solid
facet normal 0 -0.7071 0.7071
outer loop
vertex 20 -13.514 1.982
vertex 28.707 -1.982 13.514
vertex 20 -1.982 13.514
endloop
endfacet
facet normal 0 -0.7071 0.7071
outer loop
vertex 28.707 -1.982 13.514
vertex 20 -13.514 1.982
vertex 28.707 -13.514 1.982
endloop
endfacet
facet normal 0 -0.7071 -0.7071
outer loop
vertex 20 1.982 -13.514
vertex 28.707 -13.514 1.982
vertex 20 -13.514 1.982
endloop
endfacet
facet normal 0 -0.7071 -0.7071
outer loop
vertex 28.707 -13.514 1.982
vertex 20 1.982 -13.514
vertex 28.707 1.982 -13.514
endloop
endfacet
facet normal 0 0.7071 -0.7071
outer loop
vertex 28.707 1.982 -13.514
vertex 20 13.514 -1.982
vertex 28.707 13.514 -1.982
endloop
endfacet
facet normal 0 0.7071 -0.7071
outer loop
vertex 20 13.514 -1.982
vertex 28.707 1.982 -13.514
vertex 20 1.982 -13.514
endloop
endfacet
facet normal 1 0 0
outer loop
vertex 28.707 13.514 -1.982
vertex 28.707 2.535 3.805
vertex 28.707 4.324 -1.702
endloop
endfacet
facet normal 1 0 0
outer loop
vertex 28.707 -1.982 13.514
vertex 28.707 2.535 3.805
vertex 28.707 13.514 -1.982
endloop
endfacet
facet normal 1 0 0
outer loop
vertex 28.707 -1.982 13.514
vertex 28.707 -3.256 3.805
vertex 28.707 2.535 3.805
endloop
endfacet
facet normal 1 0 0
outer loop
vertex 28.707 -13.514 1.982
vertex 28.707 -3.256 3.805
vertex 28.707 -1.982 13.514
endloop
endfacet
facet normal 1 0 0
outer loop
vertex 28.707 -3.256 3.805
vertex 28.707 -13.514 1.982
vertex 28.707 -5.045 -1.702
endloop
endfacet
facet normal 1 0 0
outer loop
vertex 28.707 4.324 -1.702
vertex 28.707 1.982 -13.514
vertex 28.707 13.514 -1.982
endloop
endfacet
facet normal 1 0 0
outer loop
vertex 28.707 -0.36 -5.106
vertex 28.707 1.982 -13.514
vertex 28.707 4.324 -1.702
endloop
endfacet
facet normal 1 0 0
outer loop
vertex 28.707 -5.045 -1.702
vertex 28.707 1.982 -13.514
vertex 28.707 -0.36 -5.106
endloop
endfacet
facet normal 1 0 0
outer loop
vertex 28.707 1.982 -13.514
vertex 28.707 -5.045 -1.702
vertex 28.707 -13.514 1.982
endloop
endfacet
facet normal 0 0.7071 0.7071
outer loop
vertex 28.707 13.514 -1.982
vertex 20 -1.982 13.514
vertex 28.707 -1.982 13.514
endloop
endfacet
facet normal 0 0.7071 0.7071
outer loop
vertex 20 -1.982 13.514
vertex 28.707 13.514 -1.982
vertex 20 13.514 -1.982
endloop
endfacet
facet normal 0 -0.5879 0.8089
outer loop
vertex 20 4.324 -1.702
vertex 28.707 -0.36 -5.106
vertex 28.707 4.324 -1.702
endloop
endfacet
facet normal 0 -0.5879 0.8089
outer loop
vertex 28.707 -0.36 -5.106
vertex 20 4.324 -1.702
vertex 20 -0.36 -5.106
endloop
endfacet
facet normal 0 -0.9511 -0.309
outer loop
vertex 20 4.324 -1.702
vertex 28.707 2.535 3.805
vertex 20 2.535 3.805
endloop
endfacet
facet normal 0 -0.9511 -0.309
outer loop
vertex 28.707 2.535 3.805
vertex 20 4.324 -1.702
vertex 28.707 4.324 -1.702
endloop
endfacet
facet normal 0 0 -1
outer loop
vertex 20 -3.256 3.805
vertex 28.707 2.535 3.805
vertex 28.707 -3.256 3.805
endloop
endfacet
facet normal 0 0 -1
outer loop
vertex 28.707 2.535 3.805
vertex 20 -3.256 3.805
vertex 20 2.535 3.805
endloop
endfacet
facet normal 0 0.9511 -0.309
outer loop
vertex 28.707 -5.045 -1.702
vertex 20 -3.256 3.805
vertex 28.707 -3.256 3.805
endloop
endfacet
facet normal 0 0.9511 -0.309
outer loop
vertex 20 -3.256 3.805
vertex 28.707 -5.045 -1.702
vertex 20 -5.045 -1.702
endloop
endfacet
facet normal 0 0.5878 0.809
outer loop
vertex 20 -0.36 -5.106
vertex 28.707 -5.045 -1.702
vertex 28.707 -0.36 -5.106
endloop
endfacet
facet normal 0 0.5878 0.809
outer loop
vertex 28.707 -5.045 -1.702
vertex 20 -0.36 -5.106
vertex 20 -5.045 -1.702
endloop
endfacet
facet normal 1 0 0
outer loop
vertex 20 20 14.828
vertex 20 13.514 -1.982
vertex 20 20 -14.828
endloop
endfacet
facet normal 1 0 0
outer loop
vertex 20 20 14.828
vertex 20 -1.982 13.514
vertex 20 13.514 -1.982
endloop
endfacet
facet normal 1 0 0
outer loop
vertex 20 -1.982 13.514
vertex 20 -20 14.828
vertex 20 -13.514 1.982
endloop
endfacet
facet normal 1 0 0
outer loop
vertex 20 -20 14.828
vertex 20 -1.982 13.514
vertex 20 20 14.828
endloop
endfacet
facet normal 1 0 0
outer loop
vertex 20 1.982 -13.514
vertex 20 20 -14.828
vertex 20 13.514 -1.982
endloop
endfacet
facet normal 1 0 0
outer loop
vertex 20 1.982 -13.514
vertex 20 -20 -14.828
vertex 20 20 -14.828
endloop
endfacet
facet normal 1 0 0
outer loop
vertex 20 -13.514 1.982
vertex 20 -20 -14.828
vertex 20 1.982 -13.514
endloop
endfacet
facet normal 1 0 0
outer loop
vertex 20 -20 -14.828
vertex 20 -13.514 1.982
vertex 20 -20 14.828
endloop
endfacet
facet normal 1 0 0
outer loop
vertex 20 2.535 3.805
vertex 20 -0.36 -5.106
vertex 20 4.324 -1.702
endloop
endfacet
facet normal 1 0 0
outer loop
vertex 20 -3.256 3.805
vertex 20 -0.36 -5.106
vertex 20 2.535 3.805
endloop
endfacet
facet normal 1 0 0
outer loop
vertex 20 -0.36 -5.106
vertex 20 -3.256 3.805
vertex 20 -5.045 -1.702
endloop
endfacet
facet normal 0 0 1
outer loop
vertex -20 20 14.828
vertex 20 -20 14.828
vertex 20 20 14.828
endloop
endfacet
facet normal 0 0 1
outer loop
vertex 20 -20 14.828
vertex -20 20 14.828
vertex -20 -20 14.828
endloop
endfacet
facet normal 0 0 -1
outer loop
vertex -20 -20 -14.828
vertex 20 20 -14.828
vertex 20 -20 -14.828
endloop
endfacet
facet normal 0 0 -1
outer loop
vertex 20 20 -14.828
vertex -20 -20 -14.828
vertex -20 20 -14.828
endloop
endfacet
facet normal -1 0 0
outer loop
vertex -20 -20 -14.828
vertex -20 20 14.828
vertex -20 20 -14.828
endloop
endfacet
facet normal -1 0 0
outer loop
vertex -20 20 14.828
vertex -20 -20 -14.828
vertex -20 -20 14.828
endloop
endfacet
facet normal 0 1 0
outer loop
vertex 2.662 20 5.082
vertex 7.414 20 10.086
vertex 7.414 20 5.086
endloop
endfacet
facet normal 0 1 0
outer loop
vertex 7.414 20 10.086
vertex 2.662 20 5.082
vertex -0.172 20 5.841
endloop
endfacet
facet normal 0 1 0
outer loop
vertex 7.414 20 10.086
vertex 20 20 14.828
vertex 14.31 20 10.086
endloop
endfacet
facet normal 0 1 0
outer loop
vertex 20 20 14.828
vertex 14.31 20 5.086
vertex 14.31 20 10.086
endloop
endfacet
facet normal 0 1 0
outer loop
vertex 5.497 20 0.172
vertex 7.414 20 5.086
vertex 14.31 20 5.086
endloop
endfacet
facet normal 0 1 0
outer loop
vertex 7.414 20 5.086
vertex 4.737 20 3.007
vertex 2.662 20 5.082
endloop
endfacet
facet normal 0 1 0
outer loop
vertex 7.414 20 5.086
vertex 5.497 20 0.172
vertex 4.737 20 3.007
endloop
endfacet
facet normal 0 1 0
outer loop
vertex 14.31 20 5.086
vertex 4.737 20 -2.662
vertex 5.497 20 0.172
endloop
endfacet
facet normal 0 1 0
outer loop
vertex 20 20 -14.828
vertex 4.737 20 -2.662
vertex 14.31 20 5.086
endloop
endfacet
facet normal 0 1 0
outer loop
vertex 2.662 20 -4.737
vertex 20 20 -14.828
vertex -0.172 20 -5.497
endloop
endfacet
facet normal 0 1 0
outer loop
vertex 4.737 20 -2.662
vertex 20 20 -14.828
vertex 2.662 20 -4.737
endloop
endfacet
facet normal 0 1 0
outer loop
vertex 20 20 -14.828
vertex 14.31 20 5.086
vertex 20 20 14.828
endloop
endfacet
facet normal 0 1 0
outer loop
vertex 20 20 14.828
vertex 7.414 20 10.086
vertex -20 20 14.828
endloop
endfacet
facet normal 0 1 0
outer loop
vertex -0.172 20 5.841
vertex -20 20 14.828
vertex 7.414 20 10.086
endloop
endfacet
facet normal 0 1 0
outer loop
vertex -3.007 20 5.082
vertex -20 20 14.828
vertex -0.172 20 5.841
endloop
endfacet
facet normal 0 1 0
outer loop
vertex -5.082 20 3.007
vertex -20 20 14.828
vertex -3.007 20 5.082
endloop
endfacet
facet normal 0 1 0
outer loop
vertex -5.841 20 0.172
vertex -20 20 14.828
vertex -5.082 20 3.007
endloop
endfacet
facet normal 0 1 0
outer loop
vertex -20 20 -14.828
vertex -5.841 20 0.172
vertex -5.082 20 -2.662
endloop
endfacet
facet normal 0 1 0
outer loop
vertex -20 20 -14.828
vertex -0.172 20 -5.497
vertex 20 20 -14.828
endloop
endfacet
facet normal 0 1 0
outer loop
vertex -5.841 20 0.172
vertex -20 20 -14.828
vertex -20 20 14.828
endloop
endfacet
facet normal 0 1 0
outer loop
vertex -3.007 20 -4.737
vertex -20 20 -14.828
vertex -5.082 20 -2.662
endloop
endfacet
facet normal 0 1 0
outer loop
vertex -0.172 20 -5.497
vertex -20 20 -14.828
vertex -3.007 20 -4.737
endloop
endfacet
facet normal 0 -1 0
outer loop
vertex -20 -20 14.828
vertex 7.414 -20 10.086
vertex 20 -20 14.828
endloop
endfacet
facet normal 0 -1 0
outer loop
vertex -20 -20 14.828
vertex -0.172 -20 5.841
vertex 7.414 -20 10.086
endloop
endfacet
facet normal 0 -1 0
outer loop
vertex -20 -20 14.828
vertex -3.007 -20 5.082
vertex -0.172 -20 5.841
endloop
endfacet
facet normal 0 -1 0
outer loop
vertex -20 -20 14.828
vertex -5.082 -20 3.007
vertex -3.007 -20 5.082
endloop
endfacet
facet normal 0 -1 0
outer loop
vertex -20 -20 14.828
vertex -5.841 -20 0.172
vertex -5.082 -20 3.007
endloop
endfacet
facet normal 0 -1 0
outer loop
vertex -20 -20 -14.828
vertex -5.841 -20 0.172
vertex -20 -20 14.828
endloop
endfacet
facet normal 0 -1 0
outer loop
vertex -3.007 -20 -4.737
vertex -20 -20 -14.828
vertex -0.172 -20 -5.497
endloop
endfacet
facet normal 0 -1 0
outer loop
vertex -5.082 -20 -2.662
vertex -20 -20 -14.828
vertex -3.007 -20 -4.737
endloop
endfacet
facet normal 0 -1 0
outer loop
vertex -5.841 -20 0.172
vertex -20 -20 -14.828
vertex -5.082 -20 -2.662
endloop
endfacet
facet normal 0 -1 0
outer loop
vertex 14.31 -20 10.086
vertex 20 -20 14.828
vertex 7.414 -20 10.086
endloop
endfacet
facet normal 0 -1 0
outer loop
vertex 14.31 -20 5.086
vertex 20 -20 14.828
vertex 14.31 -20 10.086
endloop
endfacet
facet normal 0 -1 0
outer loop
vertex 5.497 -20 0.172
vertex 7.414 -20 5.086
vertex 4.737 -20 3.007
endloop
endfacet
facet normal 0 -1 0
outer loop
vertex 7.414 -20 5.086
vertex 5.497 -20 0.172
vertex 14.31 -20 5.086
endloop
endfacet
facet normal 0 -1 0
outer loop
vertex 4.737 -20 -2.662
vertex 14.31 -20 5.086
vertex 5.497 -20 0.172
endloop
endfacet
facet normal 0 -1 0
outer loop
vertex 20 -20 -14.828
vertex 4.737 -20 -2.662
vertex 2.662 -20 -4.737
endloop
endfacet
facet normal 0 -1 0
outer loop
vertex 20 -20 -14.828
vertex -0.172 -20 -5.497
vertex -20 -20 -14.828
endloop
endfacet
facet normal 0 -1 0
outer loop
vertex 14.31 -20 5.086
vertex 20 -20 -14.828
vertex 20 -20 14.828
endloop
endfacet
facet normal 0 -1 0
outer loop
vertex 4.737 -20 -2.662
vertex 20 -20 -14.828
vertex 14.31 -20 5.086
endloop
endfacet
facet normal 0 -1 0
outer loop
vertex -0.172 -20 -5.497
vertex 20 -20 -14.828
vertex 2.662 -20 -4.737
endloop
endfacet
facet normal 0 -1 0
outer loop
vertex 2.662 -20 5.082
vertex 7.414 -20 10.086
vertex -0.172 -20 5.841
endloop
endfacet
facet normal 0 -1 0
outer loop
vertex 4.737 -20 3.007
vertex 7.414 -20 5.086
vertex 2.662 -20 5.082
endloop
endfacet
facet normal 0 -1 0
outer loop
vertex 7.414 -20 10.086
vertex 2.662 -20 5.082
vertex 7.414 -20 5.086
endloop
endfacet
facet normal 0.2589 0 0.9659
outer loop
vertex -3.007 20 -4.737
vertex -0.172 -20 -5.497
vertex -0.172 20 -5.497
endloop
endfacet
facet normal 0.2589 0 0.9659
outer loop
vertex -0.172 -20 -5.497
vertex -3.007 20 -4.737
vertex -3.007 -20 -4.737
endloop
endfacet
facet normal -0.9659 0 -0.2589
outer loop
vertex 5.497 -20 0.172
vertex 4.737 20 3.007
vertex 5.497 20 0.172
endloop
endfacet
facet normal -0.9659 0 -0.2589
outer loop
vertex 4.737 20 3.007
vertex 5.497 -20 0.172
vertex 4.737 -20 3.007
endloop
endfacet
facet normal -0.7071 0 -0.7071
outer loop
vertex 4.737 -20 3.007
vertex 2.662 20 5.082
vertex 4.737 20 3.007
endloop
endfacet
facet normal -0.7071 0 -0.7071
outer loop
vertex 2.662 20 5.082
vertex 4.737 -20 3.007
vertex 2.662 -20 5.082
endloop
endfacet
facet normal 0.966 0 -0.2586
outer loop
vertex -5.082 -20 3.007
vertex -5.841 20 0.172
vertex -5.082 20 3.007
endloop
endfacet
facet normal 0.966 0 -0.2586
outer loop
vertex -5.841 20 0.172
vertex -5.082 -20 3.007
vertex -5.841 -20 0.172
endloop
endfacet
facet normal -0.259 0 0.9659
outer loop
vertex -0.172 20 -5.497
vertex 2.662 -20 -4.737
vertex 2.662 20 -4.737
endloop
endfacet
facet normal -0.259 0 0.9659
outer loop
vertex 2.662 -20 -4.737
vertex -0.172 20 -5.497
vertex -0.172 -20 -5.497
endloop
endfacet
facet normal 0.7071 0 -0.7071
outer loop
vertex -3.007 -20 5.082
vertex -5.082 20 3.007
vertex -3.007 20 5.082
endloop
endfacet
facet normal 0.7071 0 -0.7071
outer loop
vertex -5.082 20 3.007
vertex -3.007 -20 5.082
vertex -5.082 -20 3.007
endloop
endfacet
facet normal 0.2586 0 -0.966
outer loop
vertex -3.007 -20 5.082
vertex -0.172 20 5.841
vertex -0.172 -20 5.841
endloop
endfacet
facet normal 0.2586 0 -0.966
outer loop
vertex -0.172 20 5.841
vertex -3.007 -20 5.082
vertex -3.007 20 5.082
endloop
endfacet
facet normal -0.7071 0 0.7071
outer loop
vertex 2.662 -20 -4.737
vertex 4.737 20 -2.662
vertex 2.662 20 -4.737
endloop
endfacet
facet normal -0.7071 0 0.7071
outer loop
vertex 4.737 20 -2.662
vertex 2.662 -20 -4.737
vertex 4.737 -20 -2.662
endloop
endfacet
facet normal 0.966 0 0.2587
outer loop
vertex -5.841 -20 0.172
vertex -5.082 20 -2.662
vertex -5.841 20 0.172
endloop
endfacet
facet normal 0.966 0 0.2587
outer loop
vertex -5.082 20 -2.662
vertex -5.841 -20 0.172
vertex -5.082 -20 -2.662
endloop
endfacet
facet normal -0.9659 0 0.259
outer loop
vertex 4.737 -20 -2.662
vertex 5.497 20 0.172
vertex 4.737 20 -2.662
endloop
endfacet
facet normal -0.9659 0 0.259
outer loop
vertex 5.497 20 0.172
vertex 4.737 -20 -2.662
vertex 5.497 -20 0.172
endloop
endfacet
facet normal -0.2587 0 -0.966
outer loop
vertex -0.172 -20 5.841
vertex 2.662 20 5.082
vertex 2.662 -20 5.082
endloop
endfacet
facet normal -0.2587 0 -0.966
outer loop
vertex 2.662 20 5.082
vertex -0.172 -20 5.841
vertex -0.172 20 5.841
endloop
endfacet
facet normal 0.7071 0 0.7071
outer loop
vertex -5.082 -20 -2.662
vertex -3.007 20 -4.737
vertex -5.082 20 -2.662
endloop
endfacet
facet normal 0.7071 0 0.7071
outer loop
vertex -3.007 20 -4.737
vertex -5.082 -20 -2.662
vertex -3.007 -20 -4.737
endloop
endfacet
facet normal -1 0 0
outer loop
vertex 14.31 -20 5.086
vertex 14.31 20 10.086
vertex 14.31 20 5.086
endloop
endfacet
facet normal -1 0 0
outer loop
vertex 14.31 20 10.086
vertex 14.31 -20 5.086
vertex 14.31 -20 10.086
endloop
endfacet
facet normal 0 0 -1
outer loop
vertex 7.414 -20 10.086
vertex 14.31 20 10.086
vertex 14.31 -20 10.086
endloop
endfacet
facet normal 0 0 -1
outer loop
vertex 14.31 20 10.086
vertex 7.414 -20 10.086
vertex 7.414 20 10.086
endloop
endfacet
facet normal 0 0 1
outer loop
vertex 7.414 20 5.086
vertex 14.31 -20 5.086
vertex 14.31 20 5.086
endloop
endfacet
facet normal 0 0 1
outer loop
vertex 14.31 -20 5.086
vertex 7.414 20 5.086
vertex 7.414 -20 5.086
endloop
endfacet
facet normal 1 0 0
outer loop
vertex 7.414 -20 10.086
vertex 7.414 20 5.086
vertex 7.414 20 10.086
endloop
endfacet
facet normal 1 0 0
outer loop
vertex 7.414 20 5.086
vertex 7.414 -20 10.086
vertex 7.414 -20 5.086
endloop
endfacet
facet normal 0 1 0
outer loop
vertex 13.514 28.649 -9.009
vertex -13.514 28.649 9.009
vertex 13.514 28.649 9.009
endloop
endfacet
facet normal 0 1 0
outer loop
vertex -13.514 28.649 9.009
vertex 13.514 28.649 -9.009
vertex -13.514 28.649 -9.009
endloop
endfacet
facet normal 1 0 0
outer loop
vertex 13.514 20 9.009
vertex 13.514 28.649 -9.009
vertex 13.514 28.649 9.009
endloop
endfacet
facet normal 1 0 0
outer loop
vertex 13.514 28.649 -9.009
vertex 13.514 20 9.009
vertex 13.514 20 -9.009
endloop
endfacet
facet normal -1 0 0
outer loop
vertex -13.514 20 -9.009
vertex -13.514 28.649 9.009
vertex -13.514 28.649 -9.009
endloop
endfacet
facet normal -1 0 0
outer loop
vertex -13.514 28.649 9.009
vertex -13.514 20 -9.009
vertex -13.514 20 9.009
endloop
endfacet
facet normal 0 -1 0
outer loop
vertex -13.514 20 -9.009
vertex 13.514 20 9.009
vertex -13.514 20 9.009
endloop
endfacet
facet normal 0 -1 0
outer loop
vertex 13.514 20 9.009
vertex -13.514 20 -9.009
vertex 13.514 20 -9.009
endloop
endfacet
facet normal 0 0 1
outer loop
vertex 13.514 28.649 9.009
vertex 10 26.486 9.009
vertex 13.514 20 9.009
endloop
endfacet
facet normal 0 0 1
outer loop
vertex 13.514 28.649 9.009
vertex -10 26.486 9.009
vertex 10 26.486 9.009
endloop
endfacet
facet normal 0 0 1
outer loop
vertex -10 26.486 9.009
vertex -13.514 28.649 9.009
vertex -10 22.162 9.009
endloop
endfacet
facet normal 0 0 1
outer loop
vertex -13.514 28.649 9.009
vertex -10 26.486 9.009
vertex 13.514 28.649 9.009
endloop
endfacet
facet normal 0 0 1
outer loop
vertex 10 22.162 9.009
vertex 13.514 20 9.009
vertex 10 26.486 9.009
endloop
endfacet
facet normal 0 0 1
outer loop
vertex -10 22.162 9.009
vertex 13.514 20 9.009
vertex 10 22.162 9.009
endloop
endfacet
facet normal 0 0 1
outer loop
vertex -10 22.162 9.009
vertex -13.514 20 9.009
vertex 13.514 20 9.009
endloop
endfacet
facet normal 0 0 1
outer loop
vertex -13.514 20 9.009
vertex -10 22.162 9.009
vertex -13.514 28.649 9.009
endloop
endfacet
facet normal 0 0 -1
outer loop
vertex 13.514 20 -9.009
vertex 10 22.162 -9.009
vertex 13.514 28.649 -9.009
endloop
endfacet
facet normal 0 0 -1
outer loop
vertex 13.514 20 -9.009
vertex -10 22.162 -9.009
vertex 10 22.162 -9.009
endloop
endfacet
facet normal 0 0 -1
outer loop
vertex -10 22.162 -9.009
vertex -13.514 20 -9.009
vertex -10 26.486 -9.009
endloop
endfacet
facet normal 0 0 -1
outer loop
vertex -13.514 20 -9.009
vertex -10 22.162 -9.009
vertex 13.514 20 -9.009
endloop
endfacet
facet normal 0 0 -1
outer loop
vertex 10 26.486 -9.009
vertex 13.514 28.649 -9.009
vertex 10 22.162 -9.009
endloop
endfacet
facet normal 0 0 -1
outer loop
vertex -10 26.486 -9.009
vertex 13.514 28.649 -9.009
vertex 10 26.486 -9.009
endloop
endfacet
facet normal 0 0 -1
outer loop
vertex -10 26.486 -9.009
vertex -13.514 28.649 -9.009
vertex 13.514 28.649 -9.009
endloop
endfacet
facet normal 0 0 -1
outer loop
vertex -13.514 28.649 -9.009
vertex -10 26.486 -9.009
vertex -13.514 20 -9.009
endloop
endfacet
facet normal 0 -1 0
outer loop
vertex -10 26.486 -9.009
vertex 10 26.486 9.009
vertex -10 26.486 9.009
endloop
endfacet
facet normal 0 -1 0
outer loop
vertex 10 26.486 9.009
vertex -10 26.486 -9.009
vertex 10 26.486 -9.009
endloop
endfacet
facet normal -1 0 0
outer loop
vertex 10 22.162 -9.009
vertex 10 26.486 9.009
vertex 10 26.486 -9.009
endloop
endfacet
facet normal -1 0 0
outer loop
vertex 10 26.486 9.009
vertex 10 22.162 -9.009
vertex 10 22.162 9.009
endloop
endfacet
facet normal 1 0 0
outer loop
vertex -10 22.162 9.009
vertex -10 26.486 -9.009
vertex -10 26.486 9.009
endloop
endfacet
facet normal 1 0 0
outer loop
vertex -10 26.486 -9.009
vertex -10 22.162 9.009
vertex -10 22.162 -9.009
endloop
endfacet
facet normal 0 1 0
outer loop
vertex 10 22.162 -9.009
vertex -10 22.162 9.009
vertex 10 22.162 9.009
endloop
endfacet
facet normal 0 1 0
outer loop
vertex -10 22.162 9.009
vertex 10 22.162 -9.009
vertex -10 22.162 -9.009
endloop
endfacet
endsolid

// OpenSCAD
difference() {
	translate([24.310348025400625,0.0,0.0]){
	rotate([0,-45.0,90]){
		cube([16.30804887487035,8.793103289519117,21.913943167188926], center = true);
	}
}

	translate([24.310348025400625,-0.3603604098978692,-0.1801802049489346]){
	rotate([0,90,0]){
		cylinder($fn = 5, h = 8.965518420715124, r1 = 4.925645697742593, r2 = 4.925645697742593, center = true);
	}
}
}
difference() {
	difference() {
	translate([0.0,0.0,0.0]){
	rotate([0,0.0,0]){
		cube([40.0,40.0,29.655171053021007], center = true);
	}
}

	translate([-0.17241381578298315,0,0.17241381578298315]){
	rotate([90,0,0]){
		cylinder($fn = 12, h = 40.0, r1 = 5.669046029590215, r2 = 5.669046029590215, center = true);
	}
}
}

	translate([10.862070394327938,0,7.586207894451259]){
	rotate([0,-0.0,0]){
		cube([6.8965526313193255,40.0,5.0000006577065115], center = true);
	}
}
}
difference() {
	translate([0.0,24.32432766810617,0.0]){
	rotate([90,0,90]){
		cube([8.648649837548861,18.01802049489346,27.02703074234019], center = true);
	}
}

	translate([0.0,24.32432766810617,0.0]){
	rotate([90,0,90]){
		cube([4.324324231441495,18.01802049489346,20.0], center = true);
	}
}
}
